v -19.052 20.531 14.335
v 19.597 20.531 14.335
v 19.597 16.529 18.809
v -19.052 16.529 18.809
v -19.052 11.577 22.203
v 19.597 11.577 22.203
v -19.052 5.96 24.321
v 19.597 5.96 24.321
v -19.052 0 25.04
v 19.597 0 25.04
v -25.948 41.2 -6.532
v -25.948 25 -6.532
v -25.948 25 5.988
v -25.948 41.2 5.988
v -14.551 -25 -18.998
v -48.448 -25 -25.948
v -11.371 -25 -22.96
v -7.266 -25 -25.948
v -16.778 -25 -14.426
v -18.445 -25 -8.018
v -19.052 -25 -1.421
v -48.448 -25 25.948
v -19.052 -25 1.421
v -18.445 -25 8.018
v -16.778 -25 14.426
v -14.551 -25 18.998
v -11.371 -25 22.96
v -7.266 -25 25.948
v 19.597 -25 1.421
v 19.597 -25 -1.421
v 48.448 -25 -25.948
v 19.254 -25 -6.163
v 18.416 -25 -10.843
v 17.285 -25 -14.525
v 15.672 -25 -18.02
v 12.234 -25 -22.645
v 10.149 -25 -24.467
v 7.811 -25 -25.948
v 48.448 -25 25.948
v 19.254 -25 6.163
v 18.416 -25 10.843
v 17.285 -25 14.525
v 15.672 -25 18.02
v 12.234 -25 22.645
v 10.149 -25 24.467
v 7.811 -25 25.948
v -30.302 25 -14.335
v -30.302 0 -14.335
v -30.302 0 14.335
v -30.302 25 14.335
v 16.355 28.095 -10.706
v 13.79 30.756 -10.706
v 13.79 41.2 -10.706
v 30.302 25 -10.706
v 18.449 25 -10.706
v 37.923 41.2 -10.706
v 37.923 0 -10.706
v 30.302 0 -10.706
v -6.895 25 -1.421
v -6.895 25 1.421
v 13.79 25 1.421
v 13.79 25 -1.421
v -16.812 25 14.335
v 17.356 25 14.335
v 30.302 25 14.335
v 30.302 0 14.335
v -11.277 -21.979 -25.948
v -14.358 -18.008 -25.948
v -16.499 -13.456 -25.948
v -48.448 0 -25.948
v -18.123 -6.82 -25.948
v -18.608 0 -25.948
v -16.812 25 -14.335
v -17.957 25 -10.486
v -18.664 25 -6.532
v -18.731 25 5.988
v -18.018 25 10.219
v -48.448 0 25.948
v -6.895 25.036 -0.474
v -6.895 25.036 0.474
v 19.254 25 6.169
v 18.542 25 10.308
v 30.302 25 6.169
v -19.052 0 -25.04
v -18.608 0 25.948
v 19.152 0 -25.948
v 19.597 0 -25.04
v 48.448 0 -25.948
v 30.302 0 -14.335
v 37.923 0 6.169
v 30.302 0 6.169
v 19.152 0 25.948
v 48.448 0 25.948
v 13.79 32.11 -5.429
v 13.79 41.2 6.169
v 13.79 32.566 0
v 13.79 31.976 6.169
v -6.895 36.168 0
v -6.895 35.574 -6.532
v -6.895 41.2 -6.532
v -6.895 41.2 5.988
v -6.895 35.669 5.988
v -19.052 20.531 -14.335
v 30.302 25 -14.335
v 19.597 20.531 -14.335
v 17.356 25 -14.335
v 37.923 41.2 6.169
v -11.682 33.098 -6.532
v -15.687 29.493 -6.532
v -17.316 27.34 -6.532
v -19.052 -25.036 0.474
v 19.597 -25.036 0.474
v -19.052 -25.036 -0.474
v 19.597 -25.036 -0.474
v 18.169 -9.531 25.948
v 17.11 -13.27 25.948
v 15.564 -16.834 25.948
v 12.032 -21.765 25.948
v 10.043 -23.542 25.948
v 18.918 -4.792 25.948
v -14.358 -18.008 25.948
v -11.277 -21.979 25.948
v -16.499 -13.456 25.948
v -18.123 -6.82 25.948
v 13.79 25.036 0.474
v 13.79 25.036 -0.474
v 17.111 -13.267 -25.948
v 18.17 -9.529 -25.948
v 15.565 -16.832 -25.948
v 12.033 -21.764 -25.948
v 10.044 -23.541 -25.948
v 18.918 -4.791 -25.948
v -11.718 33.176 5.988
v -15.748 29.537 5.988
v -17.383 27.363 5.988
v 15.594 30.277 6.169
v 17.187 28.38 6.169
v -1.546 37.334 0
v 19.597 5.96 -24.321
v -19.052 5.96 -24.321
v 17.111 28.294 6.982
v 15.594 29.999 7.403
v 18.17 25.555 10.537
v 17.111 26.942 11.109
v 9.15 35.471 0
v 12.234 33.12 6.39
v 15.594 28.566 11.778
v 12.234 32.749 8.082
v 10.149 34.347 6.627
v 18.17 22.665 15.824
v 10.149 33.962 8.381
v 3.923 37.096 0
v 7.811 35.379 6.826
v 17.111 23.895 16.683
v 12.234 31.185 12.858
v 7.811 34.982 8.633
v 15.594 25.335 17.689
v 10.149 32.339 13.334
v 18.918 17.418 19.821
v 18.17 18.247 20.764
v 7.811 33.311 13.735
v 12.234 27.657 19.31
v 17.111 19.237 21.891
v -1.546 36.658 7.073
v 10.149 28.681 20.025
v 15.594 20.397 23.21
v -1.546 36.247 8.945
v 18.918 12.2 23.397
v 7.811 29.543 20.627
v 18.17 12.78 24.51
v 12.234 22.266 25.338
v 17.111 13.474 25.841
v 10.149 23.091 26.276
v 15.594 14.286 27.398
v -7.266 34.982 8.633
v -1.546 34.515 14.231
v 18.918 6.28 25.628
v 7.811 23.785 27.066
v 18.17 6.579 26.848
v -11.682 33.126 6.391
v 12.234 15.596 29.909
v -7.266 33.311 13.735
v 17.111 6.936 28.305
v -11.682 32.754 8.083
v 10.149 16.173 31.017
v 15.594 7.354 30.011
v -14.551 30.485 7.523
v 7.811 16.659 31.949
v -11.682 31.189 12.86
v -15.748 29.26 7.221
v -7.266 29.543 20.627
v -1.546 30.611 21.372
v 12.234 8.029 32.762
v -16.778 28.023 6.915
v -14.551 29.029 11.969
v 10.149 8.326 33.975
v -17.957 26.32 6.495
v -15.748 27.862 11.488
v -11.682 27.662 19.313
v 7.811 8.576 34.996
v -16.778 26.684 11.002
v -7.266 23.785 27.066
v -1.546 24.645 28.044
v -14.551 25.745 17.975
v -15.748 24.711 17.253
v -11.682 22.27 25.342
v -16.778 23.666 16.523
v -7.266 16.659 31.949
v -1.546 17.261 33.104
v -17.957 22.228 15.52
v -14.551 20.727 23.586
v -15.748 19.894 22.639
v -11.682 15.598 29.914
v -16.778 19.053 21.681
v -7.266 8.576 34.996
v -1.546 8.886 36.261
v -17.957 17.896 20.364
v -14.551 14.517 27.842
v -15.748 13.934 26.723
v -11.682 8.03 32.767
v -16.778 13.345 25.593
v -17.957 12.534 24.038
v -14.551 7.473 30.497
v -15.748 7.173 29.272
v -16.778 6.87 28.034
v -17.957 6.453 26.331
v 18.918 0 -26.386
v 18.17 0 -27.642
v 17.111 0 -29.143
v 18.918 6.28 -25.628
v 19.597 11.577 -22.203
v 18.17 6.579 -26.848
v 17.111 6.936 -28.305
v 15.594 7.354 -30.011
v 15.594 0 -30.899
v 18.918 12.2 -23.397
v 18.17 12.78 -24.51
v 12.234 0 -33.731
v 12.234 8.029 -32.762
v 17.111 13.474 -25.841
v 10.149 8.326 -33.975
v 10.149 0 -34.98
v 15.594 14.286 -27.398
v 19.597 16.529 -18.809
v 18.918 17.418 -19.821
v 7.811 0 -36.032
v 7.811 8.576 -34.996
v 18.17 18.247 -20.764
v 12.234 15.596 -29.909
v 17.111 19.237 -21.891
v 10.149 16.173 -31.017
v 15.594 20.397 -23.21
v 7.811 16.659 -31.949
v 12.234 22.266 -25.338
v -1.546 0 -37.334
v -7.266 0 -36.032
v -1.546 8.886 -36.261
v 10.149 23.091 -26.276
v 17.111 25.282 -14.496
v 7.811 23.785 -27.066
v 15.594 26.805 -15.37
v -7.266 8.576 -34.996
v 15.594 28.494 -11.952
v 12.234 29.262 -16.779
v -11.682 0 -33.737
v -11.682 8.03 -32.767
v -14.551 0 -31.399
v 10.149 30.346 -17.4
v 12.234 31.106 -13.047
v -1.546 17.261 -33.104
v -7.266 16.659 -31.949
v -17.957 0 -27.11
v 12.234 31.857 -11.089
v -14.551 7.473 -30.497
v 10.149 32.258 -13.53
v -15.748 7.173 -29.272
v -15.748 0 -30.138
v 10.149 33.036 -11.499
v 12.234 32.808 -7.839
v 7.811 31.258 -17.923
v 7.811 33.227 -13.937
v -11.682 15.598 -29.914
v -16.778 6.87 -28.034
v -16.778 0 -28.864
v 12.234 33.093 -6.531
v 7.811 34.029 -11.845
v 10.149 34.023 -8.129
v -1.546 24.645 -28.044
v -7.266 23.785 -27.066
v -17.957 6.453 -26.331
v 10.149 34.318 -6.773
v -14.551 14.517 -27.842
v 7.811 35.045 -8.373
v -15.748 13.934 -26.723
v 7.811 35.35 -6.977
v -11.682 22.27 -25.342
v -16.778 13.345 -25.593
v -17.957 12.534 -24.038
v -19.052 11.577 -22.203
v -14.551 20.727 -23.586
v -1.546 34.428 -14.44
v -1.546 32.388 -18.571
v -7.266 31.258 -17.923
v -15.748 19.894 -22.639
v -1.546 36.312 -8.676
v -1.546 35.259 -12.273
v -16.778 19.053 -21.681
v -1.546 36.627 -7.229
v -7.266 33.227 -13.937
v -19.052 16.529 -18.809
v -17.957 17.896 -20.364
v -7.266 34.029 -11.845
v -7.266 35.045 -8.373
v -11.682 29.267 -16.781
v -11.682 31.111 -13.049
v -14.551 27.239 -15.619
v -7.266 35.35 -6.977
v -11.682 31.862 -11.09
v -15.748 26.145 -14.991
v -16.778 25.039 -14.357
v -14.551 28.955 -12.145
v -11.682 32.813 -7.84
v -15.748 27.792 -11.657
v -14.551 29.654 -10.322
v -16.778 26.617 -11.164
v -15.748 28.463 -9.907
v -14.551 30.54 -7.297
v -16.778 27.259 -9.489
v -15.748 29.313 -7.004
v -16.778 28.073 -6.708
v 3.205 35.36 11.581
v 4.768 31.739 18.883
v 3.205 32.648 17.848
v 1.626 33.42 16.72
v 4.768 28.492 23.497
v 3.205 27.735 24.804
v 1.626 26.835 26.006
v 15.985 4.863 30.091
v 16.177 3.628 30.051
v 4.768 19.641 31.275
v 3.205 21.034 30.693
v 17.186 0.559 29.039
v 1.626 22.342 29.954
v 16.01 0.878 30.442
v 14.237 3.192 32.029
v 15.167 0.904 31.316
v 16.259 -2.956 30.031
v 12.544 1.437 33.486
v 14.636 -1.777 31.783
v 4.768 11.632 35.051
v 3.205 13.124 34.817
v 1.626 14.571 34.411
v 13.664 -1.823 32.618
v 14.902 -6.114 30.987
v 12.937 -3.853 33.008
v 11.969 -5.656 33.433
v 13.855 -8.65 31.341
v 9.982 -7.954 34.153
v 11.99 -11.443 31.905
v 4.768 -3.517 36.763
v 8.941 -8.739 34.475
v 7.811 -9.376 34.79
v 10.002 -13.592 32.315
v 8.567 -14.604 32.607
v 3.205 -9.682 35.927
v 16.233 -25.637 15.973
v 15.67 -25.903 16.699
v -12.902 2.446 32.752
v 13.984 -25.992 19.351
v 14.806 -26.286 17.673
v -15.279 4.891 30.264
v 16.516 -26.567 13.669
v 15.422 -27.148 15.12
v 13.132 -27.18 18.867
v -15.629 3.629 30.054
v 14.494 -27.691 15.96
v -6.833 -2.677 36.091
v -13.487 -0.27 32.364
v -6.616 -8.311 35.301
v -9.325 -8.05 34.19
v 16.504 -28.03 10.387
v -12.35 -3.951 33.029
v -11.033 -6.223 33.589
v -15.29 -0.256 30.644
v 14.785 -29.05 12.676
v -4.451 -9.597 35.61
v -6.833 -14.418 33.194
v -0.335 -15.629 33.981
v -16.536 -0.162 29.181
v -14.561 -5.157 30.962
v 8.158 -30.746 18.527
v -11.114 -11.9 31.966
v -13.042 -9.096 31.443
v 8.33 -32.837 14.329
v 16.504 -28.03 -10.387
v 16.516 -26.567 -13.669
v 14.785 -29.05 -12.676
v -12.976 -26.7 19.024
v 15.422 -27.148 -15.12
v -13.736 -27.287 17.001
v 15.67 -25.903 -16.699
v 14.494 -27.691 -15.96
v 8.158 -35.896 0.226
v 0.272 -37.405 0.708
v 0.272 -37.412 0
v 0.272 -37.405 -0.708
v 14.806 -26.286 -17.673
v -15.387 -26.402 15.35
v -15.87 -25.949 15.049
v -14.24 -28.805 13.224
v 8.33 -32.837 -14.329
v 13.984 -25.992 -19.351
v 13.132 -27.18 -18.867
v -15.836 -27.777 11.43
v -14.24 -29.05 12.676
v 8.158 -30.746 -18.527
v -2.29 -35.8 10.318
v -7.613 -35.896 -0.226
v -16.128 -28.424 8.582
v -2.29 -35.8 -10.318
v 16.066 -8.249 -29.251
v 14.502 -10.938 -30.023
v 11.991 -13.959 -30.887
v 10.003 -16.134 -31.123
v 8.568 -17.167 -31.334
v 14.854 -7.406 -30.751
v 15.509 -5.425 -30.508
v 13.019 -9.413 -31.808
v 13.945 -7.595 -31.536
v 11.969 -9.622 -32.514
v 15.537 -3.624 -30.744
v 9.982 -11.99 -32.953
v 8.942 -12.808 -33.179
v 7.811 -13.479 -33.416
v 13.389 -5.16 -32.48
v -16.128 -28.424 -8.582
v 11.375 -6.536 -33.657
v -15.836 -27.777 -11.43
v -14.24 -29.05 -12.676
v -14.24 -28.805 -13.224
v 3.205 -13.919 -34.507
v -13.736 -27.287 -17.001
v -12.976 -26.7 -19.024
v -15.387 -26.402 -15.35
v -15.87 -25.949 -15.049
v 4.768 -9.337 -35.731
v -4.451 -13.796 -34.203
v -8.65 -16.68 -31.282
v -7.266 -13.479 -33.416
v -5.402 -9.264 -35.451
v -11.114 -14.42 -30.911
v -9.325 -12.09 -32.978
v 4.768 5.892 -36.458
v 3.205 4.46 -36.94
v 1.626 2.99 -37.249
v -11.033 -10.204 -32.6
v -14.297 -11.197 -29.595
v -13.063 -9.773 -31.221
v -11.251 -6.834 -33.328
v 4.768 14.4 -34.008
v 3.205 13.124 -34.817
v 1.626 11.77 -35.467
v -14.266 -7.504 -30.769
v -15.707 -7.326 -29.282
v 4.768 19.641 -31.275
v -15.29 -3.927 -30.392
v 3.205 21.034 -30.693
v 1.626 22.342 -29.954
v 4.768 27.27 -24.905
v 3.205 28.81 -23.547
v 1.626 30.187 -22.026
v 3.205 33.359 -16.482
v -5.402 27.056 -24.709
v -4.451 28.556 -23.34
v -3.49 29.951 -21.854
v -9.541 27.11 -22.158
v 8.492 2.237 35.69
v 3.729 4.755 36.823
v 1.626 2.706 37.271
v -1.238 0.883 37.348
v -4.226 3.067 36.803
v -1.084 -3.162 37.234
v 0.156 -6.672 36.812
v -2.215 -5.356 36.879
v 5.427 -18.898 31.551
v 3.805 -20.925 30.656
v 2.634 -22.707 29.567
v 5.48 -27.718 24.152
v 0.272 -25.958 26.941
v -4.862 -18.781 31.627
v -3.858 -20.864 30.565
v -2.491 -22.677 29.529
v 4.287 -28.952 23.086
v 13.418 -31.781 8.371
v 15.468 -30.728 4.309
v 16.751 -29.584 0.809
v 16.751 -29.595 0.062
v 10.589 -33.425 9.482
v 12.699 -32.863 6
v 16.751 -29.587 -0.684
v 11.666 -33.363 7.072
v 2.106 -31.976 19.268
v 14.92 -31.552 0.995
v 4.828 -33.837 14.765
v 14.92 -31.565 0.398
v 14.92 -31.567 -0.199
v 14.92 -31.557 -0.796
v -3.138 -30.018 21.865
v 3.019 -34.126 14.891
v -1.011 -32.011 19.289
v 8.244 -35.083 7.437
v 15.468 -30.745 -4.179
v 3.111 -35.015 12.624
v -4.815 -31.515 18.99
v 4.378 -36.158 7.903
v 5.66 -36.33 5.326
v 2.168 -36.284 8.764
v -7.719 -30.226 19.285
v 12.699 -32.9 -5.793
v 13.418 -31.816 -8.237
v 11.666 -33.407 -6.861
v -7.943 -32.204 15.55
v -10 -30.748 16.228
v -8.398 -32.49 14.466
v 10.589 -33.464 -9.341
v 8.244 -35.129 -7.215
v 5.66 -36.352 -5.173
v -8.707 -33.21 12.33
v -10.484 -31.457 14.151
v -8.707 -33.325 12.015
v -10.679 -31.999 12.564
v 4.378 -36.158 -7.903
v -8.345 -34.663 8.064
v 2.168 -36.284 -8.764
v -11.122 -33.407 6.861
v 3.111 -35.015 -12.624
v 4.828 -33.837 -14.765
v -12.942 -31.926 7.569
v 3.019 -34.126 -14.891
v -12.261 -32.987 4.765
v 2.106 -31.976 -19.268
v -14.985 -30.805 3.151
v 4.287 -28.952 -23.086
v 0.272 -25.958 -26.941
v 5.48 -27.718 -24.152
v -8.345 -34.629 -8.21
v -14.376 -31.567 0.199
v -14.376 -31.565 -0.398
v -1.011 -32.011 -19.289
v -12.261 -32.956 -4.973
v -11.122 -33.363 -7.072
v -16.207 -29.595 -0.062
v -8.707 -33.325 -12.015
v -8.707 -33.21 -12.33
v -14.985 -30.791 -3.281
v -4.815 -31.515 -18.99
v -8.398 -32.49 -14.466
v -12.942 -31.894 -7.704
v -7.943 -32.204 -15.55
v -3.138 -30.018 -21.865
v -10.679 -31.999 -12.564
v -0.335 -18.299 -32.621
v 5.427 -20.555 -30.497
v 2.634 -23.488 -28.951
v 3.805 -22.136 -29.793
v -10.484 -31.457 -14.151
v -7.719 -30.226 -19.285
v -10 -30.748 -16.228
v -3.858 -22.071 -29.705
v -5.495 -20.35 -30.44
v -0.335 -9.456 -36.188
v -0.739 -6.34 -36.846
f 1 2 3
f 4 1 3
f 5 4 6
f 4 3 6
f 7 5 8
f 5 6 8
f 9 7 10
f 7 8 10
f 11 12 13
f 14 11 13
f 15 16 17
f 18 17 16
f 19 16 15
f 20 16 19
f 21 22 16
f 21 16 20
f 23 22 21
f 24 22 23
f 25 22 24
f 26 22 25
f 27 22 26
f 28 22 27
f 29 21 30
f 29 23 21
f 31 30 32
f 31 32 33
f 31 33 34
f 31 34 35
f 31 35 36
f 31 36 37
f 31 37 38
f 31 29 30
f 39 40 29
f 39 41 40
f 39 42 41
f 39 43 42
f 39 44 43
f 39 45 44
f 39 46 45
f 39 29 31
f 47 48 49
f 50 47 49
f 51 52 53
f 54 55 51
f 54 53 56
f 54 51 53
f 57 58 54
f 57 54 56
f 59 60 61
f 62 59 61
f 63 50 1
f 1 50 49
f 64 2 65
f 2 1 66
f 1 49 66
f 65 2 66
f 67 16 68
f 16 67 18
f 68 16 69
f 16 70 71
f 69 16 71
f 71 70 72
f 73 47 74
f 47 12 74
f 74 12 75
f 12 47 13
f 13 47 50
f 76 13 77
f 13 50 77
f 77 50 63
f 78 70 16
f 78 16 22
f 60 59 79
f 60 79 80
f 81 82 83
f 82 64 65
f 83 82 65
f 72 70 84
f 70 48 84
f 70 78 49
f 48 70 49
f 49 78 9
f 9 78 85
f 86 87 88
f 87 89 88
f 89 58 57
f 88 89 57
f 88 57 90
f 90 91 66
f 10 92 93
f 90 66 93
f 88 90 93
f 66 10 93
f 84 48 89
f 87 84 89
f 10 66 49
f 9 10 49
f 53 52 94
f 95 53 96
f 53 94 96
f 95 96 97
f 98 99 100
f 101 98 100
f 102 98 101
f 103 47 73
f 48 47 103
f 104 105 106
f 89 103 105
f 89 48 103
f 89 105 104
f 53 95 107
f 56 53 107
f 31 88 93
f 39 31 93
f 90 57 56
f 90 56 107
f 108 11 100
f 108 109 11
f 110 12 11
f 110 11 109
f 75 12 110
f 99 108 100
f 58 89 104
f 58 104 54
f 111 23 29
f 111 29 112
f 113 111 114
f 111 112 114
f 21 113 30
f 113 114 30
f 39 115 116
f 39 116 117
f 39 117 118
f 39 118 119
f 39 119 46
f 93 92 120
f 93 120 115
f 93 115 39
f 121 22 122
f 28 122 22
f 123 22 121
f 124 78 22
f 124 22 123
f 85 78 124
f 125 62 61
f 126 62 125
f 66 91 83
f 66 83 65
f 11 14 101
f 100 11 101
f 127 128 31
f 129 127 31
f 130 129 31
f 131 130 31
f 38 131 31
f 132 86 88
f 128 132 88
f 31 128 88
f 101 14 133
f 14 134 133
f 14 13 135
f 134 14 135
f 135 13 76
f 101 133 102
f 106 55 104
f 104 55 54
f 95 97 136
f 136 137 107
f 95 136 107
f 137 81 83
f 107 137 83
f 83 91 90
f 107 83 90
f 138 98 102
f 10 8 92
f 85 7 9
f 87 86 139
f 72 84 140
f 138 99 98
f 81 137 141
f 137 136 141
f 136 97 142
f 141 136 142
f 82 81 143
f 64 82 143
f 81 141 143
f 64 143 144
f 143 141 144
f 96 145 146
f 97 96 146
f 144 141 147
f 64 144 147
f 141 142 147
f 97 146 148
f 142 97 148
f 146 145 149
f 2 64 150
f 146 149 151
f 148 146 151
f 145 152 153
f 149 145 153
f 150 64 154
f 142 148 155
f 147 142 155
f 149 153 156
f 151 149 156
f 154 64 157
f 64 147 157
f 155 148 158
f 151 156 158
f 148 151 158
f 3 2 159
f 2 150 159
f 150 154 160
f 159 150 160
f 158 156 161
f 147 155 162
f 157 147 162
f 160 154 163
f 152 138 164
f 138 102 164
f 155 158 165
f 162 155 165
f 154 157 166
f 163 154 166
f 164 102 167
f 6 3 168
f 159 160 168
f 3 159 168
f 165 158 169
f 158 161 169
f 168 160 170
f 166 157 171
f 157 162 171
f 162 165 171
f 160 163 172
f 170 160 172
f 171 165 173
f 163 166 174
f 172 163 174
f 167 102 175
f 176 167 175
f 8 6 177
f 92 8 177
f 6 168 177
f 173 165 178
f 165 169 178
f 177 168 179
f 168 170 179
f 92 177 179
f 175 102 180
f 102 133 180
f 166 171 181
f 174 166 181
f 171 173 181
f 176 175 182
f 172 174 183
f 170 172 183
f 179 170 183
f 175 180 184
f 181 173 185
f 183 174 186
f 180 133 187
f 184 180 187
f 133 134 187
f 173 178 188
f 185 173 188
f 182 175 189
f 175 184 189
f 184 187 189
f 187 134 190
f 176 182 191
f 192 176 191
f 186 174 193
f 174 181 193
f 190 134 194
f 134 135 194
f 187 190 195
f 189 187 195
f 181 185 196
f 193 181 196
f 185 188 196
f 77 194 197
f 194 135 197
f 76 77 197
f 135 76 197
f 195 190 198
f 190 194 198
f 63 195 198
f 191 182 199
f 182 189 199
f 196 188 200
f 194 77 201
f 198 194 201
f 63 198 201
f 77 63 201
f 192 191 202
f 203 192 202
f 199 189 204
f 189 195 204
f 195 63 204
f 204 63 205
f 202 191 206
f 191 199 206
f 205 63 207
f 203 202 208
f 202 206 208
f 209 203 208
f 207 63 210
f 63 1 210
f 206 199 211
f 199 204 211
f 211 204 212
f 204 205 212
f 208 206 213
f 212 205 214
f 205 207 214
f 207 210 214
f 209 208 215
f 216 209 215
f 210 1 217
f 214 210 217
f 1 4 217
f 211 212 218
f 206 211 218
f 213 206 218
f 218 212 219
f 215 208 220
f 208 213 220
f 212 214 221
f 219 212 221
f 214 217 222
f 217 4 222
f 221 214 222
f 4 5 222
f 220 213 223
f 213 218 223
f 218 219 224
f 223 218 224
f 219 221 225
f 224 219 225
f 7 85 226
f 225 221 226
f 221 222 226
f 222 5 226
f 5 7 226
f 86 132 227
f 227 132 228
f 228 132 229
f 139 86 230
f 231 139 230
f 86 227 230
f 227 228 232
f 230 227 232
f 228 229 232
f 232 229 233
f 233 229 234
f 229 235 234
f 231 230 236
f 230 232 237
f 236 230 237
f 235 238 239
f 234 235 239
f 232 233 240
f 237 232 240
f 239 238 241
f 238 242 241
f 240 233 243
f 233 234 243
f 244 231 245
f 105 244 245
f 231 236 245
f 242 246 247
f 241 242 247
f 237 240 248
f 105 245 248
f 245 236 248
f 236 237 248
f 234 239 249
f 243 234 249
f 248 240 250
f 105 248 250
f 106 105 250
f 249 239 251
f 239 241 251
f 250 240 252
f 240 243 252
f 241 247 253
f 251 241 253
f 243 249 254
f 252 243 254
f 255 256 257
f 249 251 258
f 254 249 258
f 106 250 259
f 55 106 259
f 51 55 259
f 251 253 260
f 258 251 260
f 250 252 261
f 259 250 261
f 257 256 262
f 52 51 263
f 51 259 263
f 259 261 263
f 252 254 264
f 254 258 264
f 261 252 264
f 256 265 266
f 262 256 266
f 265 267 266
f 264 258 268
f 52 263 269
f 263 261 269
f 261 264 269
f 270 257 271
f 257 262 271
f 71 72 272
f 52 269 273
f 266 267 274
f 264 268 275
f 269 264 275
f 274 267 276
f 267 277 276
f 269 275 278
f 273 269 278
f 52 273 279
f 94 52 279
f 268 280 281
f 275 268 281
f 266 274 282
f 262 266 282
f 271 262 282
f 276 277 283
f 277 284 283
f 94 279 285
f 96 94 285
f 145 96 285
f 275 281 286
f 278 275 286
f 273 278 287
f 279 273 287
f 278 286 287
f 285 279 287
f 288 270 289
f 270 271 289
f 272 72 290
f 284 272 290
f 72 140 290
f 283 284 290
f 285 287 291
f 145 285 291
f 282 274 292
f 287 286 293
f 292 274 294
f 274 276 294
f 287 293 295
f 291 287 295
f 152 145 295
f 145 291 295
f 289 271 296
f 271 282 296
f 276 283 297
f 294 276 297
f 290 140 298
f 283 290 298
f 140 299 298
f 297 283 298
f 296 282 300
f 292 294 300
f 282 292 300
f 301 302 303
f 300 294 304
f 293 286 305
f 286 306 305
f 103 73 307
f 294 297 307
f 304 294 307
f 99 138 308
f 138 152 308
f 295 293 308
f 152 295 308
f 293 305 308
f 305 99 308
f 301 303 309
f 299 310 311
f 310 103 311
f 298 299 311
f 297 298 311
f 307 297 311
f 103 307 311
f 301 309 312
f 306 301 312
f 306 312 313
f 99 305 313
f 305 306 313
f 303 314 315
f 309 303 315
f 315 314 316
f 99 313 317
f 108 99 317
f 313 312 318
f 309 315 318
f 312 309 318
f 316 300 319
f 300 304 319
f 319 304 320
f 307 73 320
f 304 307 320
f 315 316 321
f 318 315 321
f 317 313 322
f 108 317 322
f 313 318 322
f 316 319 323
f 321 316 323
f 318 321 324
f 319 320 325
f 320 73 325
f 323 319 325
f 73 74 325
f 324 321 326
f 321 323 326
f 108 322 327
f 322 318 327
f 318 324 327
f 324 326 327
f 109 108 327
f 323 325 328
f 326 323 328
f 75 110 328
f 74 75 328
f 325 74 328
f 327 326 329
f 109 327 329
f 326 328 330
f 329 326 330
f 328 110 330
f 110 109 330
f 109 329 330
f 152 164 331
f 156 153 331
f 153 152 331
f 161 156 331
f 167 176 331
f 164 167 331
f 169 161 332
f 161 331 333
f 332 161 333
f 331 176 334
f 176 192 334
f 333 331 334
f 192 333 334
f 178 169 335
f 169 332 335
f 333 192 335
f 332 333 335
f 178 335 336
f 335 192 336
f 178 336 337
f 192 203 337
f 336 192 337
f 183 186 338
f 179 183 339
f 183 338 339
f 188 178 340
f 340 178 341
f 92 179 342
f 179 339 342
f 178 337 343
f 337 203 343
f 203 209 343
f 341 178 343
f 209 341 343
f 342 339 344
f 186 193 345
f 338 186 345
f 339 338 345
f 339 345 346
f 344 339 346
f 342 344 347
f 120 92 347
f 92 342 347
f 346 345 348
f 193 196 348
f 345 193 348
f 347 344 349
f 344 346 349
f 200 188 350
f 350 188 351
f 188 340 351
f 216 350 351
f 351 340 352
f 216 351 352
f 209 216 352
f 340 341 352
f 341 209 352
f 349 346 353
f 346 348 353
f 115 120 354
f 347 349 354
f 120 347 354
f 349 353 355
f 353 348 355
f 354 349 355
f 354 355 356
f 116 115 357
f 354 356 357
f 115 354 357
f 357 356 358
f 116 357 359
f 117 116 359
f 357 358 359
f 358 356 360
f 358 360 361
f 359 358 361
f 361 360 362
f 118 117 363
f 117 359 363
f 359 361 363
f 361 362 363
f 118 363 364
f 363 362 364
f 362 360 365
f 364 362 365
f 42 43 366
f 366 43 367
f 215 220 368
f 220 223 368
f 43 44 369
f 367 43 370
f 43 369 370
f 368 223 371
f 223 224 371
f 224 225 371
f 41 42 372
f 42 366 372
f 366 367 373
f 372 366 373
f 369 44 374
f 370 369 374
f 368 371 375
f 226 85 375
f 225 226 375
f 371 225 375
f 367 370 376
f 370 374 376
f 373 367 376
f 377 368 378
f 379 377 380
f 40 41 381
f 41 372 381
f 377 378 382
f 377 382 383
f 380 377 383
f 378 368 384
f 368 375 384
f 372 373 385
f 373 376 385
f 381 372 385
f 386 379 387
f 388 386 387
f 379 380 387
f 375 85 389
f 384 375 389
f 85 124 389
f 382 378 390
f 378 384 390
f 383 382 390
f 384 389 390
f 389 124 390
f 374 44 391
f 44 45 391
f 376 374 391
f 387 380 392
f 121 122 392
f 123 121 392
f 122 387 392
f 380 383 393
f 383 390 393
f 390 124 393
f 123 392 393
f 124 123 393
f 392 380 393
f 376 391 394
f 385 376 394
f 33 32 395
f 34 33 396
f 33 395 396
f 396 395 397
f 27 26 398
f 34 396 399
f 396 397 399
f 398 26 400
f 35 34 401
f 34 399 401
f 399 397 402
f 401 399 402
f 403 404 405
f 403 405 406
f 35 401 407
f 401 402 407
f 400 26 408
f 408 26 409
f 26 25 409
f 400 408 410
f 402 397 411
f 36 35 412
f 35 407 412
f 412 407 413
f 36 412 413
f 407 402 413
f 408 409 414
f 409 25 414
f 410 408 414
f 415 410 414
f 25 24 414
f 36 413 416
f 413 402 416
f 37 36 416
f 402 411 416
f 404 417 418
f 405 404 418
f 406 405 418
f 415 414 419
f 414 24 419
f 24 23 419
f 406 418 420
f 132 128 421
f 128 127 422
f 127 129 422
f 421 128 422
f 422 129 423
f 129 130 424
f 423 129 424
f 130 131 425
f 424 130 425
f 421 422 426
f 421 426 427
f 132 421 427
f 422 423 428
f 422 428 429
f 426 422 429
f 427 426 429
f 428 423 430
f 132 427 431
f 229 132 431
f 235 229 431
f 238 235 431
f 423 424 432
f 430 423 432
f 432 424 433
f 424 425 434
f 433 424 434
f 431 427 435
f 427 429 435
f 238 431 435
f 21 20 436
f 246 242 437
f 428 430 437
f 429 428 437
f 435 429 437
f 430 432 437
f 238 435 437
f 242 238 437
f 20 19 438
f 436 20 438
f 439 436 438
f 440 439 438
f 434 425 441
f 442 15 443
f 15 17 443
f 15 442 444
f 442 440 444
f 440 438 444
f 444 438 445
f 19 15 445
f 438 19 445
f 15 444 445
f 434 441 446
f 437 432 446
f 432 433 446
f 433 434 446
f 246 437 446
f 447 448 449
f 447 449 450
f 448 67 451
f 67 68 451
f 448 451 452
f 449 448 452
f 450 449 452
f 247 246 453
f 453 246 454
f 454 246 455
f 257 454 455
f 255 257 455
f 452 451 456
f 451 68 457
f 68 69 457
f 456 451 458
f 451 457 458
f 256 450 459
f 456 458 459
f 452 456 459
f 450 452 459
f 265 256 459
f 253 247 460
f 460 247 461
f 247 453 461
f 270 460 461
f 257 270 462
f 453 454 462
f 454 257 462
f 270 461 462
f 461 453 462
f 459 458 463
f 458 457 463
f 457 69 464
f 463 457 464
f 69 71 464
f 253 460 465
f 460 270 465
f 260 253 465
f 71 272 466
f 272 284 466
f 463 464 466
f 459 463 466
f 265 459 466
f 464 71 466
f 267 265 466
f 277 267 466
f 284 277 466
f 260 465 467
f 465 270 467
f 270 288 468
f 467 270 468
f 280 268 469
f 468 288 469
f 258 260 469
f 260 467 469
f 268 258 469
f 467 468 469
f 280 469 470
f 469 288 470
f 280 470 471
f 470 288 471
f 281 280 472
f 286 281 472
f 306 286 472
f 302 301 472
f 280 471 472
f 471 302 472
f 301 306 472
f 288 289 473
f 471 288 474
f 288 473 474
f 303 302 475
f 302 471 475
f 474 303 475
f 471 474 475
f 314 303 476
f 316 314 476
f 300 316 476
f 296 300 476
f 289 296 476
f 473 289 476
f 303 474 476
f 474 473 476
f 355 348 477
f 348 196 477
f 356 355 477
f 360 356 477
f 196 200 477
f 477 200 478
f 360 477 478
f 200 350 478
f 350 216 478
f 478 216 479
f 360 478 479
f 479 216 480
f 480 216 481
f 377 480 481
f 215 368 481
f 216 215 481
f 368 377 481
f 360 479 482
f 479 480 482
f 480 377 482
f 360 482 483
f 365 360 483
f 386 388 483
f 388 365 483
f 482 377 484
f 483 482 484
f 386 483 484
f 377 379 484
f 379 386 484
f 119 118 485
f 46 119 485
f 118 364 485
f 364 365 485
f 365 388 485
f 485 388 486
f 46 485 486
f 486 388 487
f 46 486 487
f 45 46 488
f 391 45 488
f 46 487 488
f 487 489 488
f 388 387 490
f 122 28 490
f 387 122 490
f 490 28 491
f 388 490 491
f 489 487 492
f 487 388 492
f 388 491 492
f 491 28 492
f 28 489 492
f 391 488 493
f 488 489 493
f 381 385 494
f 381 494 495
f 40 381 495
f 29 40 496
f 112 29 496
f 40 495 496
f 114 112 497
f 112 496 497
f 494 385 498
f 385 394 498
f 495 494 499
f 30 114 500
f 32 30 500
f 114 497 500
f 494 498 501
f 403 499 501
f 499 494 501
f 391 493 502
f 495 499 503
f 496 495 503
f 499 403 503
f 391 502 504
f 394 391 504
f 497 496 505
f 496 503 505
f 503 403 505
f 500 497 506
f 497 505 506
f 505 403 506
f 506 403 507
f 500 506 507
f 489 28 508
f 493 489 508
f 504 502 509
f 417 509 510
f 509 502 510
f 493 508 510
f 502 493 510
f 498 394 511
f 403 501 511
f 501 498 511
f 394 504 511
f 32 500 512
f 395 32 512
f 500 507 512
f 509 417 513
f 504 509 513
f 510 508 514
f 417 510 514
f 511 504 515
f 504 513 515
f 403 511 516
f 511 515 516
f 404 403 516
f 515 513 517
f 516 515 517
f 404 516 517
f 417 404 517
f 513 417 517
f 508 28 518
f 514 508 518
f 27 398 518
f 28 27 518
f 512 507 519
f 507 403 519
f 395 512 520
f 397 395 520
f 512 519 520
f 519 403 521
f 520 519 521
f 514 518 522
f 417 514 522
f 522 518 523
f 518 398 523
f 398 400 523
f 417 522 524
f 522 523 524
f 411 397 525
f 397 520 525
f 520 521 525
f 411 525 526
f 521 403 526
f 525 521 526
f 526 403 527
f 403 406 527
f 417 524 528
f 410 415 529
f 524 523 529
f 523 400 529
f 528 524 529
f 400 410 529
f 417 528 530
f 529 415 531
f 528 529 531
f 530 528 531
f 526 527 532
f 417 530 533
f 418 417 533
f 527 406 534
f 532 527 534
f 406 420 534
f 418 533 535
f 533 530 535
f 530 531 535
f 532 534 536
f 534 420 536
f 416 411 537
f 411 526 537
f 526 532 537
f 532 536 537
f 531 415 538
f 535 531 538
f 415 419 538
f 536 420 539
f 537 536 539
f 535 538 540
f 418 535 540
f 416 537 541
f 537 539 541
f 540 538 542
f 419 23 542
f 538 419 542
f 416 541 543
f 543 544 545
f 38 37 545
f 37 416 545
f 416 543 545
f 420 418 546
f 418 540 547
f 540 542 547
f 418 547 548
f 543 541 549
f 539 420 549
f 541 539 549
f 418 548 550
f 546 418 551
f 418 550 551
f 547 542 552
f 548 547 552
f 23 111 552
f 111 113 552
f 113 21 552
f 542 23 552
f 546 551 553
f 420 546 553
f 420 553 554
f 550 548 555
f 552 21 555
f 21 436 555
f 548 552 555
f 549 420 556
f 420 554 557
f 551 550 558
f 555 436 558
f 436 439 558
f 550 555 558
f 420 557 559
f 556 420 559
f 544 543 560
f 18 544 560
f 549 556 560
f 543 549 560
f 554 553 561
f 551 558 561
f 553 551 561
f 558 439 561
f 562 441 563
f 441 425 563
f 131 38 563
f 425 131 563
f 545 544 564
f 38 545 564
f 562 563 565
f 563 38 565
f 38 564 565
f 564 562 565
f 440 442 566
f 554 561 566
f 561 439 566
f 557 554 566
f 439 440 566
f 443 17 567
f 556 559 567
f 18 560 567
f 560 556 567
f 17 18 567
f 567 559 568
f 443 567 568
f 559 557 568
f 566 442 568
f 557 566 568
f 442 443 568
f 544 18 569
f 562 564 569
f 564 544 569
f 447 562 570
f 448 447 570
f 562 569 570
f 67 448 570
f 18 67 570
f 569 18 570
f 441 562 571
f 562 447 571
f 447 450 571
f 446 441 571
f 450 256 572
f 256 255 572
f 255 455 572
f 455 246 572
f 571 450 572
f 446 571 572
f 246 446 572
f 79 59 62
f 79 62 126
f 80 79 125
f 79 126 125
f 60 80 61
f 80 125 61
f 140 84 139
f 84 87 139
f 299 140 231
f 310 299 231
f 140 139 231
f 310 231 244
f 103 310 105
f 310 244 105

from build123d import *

# Parameters (mm, degrees)
F0_W     = 96.895166
F0_H     = 51.89516
F1_DEPTH = 25
F2_W     = 60.604836
F2_H     = 28.669358
F3_DEPTH = 25
F4_W     = 19.05242
F4_H     = 12.520161
F4_W_2   = 24.133065
F4_H_2   = 16.875
F5_DEPTH = 66.2


with BuildPart() as f1:
    # F0 (on Front) → F1 (new body)
    with BuildSketch(Plane.XZ):
        Rectangle(F0_W, F0_H)
    extrude(amount=F1_DEPTH)

    # F2 (on Front) → F3 (join)
    with BuildSketch(Plane.XZ):
        Rectangle(F2_W, F2_H)
    extrude(amount=-F3_DEPTH)

    # F4 (on face) → F5 (join)
    with BuildSketch(Plane.XZ.offset(25)):
        with Locations((-16.421372, -0.272178)):
            Rectangle(F4_W, F4_H)
        with Locations((25.856855, -2.268145)):
            Rectangle(F4_W_2, F4_H_2)
    extrude(amount=-F5_DEPTH)

    # F6 (on Top) → F7 (revolve)
    with BuildSketch(Plane.XY):
        with BuildLine():
            Line((-19.05242, 25.040325), (19.596776, 25.040325))
            ThreePointArc((19.596776, 25.040325), (0.272178, 37.411746), (-19.05242, 25.040325))
        make_face()
    revolve(axis=Axis((-1.814518, 0, 0), (1, 0, 0)))


solid = f1.part
